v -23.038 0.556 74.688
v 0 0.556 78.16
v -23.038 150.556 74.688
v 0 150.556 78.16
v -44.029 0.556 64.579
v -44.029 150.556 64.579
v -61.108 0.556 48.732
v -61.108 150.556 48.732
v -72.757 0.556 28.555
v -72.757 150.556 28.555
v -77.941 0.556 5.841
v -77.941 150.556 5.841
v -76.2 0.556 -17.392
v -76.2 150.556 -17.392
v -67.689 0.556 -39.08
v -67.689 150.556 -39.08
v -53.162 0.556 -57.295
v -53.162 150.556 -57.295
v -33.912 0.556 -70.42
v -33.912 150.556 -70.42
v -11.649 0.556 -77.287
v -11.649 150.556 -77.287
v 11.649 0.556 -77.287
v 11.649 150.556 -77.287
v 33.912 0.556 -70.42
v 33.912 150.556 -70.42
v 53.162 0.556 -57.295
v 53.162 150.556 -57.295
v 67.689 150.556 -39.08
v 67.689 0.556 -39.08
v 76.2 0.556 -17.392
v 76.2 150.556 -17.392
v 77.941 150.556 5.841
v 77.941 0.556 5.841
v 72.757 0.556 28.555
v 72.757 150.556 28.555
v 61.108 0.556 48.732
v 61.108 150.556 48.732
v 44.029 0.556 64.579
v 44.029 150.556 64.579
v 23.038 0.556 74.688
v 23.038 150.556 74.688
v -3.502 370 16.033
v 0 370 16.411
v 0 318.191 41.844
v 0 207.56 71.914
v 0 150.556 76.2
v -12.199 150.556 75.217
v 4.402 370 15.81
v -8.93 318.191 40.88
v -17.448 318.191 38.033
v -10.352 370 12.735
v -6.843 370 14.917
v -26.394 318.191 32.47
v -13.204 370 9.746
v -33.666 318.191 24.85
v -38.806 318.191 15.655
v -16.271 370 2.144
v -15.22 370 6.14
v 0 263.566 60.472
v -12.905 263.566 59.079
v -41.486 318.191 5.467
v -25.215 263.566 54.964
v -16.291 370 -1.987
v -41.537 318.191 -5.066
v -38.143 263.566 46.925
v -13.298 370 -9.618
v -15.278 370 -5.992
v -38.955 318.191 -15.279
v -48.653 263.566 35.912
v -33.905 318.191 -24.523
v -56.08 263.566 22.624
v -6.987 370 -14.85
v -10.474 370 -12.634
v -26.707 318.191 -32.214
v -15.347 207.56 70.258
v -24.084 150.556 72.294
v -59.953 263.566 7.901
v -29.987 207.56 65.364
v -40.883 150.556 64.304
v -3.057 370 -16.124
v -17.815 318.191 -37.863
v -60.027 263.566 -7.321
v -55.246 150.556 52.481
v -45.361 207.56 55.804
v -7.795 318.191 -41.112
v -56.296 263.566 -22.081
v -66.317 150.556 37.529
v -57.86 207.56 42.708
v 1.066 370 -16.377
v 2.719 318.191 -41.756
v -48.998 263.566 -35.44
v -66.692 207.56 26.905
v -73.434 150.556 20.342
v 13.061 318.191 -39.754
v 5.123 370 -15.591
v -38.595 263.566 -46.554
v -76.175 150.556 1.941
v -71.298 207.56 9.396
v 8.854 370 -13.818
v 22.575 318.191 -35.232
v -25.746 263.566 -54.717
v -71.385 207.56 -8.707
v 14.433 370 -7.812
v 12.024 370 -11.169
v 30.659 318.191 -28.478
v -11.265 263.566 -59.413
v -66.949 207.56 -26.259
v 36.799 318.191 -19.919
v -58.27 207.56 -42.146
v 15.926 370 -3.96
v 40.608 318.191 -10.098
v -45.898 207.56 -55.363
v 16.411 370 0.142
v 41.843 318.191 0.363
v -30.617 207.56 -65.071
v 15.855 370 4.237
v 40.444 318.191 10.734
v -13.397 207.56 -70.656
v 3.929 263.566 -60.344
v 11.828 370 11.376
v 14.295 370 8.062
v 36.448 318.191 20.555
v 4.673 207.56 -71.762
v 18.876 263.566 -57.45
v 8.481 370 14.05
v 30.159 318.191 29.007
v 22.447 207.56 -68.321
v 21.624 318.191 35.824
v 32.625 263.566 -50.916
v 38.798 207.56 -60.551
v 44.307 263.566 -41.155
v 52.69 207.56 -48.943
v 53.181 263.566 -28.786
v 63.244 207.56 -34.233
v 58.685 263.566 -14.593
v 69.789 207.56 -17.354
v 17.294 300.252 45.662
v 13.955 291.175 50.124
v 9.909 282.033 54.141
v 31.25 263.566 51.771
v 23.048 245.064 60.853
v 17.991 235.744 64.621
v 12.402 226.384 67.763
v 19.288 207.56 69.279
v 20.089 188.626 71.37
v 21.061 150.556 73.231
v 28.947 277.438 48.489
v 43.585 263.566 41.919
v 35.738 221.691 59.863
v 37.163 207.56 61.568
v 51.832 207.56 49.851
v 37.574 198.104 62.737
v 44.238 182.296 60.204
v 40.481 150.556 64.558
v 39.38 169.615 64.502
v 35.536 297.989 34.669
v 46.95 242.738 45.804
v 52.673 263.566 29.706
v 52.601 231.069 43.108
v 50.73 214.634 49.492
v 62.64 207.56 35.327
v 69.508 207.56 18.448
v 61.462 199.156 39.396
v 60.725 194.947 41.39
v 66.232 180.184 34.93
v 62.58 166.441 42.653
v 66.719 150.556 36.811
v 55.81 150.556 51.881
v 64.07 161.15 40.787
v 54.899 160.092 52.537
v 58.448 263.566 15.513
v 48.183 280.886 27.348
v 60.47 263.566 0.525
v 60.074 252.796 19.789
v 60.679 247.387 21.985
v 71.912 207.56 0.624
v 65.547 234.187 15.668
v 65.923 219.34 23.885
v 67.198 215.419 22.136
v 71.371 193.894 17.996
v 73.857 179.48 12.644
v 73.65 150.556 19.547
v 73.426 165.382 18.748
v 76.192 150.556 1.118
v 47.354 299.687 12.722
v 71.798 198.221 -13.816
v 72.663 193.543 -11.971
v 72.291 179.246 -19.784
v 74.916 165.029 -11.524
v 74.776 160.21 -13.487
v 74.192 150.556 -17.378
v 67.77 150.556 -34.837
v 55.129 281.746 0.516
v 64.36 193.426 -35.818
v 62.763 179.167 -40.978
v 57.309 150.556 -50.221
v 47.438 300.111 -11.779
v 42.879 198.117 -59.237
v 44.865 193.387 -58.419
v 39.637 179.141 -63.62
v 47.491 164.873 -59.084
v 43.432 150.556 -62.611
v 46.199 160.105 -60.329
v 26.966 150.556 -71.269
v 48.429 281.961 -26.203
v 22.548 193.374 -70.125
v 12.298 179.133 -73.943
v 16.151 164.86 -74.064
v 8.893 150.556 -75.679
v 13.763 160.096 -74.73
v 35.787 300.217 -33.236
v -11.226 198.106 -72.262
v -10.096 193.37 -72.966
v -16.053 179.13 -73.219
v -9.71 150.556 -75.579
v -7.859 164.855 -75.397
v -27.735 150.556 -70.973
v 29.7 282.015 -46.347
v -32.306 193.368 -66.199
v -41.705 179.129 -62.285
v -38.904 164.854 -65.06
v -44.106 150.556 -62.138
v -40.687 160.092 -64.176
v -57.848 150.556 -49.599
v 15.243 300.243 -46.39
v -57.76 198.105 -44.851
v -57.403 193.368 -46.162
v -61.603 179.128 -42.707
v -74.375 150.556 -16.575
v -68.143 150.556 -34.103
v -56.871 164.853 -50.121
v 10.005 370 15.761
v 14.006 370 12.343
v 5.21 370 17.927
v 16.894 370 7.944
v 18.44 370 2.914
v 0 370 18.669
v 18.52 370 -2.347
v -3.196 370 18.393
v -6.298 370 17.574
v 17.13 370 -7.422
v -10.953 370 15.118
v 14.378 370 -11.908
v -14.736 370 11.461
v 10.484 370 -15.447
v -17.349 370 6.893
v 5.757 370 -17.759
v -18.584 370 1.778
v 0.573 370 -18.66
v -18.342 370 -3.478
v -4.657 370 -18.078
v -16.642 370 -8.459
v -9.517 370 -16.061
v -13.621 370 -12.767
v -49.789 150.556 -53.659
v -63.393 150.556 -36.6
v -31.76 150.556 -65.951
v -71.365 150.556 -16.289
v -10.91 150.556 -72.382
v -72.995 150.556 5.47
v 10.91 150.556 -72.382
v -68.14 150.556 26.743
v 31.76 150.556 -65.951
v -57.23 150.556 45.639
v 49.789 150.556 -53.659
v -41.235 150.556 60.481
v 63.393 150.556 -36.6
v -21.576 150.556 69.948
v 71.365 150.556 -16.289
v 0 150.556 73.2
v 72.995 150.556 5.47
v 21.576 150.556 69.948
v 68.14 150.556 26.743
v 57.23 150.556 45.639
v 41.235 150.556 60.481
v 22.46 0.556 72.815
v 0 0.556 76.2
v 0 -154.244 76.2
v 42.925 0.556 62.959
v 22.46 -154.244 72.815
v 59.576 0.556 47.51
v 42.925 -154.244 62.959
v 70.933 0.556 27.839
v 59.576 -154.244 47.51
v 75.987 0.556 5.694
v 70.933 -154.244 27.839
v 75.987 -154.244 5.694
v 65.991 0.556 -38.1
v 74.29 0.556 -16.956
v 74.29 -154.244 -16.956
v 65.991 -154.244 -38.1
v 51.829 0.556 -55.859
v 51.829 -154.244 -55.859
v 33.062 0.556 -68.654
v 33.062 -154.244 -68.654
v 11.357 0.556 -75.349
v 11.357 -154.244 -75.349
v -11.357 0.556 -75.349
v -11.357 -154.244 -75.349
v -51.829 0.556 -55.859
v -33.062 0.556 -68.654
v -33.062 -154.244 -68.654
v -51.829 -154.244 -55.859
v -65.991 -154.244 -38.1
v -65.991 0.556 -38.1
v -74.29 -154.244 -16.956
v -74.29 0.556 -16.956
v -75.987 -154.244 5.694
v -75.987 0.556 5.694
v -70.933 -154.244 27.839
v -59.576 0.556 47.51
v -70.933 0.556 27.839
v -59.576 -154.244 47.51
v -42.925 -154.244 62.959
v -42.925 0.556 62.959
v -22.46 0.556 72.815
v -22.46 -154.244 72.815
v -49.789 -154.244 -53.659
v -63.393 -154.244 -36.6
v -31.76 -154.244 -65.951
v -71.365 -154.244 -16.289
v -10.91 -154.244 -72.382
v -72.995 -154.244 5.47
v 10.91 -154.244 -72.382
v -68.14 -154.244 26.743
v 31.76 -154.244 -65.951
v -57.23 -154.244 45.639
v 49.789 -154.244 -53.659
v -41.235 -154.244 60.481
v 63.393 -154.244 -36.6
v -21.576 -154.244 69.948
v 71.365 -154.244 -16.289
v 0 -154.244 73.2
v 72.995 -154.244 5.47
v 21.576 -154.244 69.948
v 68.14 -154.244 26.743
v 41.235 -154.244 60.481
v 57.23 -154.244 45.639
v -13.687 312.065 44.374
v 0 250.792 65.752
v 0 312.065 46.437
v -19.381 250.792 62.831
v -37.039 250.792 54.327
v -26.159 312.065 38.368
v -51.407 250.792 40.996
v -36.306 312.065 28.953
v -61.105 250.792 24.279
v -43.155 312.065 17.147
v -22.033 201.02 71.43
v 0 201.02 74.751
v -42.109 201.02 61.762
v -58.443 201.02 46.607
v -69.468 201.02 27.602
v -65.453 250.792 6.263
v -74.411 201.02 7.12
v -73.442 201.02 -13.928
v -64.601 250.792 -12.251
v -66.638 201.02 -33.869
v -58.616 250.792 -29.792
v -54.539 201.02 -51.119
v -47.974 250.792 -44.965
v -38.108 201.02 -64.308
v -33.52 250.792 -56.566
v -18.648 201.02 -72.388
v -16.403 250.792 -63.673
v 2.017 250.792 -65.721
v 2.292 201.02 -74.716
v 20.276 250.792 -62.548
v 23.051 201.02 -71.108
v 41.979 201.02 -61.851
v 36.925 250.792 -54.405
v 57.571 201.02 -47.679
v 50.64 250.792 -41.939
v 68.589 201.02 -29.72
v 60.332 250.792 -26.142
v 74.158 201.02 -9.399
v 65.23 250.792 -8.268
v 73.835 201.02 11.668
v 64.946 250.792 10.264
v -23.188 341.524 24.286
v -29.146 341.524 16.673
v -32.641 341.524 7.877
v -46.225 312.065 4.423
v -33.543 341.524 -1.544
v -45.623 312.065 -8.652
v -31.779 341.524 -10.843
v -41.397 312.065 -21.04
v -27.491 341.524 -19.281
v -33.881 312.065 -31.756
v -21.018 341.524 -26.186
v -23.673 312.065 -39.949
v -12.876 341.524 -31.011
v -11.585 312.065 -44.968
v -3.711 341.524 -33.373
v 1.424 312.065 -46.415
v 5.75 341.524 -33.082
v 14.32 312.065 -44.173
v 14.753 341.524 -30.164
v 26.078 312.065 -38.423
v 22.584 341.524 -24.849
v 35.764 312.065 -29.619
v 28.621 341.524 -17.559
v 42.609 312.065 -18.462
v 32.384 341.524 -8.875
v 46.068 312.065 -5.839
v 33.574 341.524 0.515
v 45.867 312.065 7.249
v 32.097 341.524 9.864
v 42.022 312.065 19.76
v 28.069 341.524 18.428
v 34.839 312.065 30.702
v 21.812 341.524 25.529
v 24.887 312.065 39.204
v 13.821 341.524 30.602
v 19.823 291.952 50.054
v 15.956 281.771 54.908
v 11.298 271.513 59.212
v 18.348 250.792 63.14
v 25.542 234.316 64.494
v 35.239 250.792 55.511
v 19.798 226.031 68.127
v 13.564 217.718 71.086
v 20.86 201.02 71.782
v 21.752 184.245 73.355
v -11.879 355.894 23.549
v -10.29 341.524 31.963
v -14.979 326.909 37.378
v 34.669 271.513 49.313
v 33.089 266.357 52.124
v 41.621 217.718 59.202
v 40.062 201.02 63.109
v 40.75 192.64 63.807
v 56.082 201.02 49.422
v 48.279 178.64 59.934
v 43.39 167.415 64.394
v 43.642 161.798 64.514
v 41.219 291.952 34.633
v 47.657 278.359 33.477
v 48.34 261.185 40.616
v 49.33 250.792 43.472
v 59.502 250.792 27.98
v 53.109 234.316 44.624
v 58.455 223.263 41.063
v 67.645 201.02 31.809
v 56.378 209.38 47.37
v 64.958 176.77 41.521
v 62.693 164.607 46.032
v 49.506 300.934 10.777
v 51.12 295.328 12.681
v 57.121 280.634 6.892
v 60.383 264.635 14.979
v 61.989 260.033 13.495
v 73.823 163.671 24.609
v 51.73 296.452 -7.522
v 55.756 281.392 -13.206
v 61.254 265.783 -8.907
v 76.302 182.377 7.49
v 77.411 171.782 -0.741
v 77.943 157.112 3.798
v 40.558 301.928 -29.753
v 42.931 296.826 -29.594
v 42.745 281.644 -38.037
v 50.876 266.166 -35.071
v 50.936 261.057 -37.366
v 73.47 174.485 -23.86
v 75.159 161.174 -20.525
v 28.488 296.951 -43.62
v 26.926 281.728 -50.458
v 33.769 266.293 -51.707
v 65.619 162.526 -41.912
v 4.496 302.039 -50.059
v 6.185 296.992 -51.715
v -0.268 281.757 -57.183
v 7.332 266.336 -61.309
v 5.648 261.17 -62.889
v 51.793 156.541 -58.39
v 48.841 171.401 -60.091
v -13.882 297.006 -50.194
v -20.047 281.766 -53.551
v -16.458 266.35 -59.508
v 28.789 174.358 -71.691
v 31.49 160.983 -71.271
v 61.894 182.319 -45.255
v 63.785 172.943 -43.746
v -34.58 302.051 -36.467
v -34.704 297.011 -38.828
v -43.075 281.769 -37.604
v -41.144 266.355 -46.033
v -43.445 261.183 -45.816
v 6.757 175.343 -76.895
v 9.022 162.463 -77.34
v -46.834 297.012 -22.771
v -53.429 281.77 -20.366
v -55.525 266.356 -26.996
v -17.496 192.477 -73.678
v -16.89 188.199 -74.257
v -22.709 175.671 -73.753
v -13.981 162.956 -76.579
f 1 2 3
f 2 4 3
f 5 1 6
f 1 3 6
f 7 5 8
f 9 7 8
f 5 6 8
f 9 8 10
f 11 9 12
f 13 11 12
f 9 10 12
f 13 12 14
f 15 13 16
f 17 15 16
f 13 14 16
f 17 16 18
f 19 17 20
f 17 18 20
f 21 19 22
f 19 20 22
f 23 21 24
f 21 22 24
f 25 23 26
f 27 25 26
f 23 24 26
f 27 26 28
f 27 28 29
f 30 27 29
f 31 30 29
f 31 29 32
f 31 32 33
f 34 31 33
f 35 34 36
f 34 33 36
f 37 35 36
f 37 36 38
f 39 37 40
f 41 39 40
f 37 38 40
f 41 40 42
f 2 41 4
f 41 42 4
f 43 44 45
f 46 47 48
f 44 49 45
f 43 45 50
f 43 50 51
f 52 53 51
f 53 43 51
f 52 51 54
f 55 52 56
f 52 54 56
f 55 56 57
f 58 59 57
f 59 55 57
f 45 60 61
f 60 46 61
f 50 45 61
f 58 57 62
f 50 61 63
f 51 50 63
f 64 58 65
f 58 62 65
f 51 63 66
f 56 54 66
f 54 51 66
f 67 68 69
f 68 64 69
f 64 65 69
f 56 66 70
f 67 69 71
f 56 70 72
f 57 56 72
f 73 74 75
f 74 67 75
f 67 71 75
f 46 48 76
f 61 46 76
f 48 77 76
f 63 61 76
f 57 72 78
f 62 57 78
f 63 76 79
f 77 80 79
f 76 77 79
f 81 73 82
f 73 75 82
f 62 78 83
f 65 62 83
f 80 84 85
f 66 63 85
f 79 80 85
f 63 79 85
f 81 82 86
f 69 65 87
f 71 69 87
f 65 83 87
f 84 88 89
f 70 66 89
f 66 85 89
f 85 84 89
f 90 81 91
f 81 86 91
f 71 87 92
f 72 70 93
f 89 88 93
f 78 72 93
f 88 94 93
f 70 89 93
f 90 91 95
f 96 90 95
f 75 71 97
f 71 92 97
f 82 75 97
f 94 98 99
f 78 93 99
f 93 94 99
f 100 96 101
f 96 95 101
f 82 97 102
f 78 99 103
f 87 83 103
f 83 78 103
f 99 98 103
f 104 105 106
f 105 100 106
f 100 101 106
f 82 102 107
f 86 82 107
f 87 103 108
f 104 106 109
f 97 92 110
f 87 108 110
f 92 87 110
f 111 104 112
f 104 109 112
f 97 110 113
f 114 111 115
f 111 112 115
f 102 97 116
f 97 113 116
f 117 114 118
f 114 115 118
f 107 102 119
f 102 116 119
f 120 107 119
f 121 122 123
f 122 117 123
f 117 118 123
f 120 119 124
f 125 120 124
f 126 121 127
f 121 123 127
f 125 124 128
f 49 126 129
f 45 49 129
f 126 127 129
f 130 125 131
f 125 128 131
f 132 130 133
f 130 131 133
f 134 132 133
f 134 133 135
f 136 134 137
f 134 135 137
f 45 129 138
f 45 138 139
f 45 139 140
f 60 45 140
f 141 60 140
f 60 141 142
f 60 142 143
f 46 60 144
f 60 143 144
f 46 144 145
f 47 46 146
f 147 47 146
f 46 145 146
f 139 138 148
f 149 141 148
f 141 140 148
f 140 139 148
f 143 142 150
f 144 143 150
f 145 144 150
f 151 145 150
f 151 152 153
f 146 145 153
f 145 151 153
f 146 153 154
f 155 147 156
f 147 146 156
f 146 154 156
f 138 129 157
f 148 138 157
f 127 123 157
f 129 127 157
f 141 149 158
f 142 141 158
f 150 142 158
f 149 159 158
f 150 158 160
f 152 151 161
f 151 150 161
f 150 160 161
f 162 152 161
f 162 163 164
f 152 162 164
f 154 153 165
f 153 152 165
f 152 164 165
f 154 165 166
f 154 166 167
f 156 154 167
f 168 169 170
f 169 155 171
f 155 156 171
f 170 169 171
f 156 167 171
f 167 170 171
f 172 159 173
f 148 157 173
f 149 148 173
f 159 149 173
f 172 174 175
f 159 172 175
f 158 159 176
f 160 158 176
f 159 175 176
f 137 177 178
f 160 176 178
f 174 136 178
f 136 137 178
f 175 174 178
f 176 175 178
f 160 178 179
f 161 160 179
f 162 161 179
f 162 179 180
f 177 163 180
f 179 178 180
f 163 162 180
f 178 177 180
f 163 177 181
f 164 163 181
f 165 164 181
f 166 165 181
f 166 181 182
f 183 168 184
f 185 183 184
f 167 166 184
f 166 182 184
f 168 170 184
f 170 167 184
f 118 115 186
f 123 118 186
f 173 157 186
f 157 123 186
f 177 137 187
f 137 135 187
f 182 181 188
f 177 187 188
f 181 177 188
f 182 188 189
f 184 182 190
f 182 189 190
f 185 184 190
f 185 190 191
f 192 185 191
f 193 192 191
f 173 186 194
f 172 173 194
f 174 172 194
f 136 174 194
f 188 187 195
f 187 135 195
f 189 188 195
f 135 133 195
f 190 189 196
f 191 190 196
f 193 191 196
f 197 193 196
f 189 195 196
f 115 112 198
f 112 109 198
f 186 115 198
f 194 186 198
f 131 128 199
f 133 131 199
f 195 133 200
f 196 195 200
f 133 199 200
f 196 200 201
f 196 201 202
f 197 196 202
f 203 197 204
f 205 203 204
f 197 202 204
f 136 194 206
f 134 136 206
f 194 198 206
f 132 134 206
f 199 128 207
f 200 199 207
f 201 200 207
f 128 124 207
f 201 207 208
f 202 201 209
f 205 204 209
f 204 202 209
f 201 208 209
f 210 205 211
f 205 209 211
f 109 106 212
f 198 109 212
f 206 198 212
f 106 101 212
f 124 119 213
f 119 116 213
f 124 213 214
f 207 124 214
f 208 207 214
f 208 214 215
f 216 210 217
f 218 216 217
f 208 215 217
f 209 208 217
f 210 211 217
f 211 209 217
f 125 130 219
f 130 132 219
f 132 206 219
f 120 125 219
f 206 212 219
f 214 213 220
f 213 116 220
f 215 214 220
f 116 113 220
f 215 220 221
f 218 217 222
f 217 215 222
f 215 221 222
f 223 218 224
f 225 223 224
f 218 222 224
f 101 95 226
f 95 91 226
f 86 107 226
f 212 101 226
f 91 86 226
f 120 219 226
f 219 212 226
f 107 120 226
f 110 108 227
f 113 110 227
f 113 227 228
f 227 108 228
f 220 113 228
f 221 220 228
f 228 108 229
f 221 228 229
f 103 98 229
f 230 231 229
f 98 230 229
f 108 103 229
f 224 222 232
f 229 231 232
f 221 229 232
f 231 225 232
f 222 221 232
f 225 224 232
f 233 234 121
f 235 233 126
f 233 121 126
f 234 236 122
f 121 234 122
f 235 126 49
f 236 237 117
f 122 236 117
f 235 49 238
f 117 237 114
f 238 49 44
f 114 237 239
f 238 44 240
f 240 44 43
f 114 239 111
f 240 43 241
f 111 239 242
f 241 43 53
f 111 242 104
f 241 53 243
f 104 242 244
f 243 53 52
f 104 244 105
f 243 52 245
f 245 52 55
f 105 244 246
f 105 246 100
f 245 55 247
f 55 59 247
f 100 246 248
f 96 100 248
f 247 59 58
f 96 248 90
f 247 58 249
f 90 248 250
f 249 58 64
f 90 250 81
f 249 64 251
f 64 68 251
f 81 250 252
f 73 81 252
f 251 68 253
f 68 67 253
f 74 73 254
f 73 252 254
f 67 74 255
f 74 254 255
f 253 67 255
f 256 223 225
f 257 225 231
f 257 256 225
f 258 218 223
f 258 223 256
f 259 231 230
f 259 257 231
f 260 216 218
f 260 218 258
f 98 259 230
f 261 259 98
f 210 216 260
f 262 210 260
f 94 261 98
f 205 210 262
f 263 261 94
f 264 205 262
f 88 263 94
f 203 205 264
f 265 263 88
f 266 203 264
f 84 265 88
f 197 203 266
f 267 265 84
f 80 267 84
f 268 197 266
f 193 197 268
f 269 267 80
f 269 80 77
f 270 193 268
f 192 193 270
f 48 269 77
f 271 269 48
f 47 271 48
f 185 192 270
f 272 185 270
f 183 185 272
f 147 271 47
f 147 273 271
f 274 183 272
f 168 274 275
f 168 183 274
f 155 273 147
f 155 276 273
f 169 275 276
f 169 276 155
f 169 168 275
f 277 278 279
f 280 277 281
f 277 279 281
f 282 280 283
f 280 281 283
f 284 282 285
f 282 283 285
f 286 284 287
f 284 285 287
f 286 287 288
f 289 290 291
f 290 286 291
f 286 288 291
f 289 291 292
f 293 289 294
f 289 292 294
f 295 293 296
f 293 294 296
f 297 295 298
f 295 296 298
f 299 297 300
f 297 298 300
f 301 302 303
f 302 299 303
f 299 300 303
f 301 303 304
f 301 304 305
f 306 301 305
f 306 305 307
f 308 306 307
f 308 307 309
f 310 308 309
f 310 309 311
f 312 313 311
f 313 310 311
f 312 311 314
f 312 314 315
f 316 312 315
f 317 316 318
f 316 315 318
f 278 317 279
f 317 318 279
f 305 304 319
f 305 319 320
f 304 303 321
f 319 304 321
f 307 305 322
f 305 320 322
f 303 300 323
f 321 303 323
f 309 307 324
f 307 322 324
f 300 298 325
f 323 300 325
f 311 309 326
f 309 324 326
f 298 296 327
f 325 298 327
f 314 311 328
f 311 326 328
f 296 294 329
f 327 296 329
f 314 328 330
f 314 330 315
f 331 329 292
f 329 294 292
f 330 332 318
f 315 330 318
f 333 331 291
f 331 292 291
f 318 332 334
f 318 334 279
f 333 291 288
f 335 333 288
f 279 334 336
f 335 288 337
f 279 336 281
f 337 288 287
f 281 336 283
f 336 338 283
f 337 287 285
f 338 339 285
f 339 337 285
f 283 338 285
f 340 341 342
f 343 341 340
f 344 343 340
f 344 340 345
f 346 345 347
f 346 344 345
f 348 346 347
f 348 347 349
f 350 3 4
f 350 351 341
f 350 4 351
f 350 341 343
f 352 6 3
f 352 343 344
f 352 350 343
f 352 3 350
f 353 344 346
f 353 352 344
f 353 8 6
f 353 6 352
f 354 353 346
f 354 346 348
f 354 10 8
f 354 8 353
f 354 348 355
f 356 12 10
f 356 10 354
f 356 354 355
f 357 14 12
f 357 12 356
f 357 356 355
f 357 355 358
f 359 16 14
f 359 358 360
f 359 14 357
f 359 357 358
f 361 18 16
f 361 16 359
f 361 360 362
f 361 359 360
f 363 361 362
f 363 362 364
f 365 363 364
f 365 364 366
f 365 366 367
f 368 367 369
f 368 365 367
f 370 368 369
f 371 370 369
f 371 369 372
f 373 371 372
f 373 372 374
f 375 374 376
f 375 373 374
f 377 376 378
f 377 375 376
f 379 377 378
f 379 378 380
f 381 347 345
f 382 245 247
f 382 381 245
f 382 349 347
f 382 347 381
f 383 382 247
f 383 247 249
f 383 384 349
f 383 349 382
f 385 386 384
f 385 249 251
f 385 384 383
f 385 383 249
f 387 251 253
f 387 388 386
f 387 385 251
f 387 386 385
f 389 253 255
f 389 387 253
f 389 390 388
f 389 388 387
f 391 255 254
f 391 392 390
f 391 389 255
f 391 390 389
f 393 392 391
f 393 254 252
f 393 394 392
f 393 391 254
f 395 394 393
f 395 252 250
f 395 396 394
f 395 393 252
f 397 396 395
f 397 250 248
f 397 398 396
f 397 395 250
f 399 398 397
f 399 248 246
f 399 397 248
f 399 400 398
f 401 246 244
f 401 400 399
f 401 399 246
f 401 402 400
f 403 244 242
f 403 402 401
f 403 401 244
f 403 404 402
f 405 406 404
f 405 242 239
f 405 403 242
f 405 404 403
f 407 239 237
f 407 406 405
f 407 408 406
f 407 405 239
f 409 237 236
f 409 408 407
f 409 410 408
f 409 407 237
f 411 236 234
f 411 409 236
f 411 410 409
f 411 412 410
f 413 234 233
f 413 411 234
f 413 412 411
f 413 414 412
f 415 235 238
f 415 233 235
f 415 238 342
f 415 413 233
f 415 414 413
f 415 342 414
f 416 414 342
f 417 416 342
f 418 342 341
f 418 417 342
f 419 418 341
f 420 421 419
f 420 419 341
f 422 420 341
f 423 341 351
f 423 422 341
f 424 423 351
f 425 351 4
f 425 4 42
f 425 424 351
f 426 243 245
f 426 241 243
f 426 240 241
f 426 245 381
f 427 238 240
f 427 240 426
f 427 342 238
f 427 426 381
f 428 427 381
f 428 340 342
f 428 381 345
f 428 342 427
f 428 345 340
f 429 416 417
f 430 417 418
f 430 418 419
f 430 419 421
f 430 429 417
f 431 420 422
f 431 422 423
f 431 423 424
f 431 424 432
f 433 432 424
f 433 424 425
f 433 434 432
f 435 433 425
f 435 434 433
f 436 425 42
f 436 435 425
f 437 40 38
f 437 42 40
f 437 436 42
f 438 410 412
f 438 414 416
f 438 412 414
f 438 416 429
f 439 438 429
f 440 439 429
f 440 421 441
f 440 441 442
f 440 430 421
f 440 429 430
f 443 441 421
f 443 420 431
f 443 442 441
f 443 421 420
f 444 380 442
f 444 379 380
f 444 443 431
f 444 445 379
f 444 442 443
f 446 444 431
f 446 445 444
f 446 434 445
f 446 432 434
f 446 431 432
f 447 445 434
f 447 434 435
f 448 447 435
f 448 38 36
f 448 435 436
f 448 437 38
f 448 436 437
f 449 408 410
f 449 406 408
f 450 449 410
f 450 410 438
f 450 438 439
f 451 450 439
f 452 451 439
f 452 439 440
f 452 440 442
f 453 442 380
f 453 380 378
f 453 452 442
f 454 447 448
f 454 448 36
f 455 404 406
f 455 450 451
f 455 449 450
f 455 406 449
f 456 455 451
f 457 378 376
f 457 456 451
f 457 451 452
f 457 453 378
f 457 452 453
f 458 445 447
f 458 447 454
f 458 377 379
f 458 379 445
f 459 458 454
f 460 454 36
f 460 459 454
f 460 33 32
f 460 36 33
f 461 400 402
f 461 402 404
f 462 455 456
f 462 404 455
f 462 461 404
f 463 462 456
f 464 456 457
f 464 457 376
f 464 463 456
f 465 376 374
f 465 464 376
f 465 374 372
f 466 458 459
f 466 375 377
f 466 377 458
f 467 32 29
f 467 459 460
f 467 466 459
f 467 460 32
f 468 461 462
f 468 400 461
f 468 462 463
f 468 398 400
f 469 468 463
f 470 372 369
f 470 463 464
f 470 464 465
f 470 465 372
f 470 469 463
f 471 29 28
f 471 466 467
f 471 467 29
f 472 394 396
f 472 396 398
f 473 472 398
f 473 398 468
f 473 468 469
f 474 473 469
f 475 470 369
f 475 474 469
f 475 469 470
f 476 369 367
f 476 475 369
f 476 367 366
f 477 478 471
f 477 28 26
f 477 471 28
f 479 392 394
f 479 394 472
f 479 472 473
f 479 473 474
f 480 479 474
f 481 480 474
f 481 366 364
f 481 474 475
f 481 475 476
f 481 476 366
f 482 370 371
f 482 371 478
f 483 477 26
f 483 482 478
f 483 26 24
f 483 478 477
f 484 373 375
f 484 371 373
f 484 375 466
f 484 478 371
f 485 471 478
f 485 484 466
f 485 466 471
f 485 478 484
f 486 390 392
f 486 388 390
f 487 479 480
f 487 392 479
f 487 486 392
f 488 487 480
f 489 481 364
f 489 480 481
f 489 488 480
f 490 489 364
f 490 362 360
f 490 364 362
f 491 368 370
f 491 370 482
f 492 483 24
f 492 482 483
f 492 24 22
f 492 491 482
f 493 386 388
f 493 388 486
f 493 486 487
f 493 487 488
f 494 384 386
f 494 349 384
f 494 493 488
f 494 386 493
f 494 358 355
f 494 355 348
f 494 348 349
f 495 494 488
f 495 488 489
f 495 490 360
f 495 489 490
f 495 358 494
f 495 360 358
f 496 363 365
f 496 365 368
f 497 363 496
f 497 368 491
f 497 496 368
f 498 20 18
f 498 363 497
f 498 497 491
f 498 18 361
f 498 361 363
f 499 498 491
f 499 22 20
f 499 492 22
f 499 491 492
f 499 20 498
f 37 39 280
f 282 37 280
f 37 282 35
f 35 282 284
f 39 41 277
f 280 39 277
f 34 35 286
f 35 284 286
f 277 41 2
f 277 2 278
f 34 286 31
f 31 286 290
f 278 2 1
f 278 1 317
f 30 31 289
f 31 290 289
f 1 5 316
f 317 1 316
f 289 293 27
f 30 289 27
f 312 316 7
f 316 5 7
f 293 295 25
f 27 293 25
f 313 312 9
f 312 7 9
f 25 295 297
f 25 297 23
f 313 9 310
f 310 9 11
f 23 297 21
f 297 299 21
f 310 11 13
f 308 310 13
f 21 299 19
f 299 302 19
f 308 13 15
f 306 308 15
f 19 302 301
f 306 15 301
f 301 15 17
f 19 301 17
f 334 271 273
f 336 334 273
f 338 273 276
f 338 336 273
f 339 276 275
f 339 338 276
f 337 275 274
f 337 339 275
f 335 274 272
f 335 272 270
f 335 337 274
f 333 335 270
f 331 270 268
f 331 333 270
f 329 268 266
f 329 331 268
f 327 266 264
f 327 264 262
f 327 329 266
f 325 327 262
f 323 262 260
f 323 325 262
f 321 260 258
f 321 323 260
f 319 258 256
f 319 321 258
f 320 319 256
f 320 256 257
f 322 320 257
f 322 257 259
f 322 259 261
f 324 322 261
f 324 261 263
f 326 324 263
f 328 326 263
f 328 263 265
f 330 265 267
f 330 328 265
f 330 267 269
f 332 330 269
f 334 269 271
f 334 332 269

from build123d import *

# Parameters (mm, degrees)
BOSS_EXTRUDE1_START = -304.8
SKETCH2_R           = 76.2
SKETCH2_R_2         = 73.2
BOSS_EXTRUDE1_DEPTH = 304.8
SKETCH3_R           = 126.460441223
CUT_EXTRUDE1_DEPTH  = 30


with BuildPart() as part:
    # Sketch1 → Revolve3 (revolve)
    with BuildSketch(Plane.XY, mode=Mode.PRIVATE) as revolve3_sk:
        with BuildLine():
            Line((78.16, 0.555796301), (78.16, 150.555796301))
            add(Edge.make_bspline(
                [(0, 400), (0.211335822, 399.688125951), (0.635814895, 399.059576984), (1.538100901, 397.718447682), (2.522216135, 396.240558988), (3.505644669, 394.750882712), (4.501021999, 393.230772914), (5.482794304, 391.717940875), (6.460002487, 390.1990457), (7.436503499, 388.667903295), (8.412102246, 387.124567018), (16.491350088, 374.228806244), (28.348045348, 353.344444451), (42.541088503, 323.752786496), (57.529234868, 282.998416237), (68.449765851, 242.872883661), (74.109605793, 210.076821303), (76.655852831, 184.808563), (77.518465345, 170.067485067), (77.680444963, 166.851372886), (77.80019329, 164.105278722), (77.872037245, 162.29067577), (77.936311693, 160.485721023), (77.993377873, 158.683168323), (78.043426294, 156.866740105), (78.085914262, 155.082628956), (78.121127528, 153.306463123), (78.145475643, 151.691137071), (78.155577952, 150.932503957), (78.16, 150.555796301)],
                knots=[0.082616428, 0.082616428, 0.082616428, 0.082616428, 0.082616428, 0.088299706, 0.093982984, 0.099666263, 0.105349541, 0.111032819, 0.116716097, 0.122399375, 0.128082653, 0.133891142, 0.139699631, 0.313954311, 0.430124092, 0.546293874, 0.685697612, 0.836718331, 0.848335309, 0.865760775, 0.871569264, 0.877252541, 0.882935819, 0.888619096, 0.894302373, 0.899985651, 0.905668928, 0.911352205, 0.917035483, 0.917035483, 0.917035483, 0.917035483, 0.917035483], degree=4))
            Line((0, 400), (0, 396.489212171))
            add(Edge.make_bspline(
                [(0, 396.489212171), (0.033950421, 396.438447854), (0.270297298, 396.084910627), (0.687269239, 395.458986868), (1.248256795, 394.612262217), (1.999478916, 393.472916562), (3.322990367, 391.451301251), (5.182734219, 388.567106013), (9.592096746, 381.590651127), (18.79448878, 366.267083026), (36.794305295, 332.203153979), (57.076508975, 280.924103704), (69.684732597, 227.240425292), (74.343019544, 188.995844434), (75.530951553, 171.160960641), (75.891349594, 162.915707977), (76.010098219, 159.486050775), (76.07694035, 157.070550778), (76.110246707, 155.706228582), (76.132780312, 154.690650434), (76.153251031, 153.650034533), (76.172421756, 152.520648044), (76.189027326, 151.409738144), (76.196427769, 150.847643517), (76.2, 150.54427492)],
                knots=[0.091851146, 0.091851146, 0.091851146, 0.091851146, 0.092394266, 0.095653545, 0.098912824, 0.102172103, 0.108690662, 0.121727778, 0.134764895, 0.186913362, 0.291210296, 0.499804164, 0.708398032, 0.812694966, 0.864843432, 0.877880549, 0.890917666, 0.897436224, 0.900695504, 0.903954783, 0.907214062, 0.910473341, 0.91373262, 0.916991899, 0.916991899, 0.916991899, 0.916991899], degree=3))
            Line((76.2, 150.54427492), (76.2, 0.555796301))
            Line((76.2, 0.555796301), (78.16, 0.555796301))
        make_face()
    revolve(revolve3_sk.sketch.rotate(Axis((0, -198.817850362, 0), (0, -1, 0)), 90), axis=Axis((0, -198.817850362, 0), (0, -1, 0)))

    # Sketch2 → Boss-Extrude1 (add)
    with BuildSketch(Plane(origin=(0, 150.555796301, 0), x_dir=(1, 0, 0), z_dir=(0, 1, 0)).offset(BOSS_EXTRUDE1_START)):
        with Locations(Location((0, 0, 0), (0, 0, 270))):
            Circle(SKETCH2_R)
        with Locations(Location((0, 0, 0), (0, 0, 270))):
            Circle(SKETCH2_R_2, mode=Mode.SUBTRACT)
    extrude(amount=BOSS_EXTRUDE1_DEPTH)

    # Sketch3 → Cut-Extrude1 (cut)
    with BuildSketch(Plane(origin=(0, 400, 0), x_dir=(-1, 0, 0), z_dir=(0, -1, 0))):
        Circle(SKETCH3_R)
    extrude(amount=CUT_EXTRUDE1_DEPTH, mode=Mode.SUBTRACT)


solid = part.part
